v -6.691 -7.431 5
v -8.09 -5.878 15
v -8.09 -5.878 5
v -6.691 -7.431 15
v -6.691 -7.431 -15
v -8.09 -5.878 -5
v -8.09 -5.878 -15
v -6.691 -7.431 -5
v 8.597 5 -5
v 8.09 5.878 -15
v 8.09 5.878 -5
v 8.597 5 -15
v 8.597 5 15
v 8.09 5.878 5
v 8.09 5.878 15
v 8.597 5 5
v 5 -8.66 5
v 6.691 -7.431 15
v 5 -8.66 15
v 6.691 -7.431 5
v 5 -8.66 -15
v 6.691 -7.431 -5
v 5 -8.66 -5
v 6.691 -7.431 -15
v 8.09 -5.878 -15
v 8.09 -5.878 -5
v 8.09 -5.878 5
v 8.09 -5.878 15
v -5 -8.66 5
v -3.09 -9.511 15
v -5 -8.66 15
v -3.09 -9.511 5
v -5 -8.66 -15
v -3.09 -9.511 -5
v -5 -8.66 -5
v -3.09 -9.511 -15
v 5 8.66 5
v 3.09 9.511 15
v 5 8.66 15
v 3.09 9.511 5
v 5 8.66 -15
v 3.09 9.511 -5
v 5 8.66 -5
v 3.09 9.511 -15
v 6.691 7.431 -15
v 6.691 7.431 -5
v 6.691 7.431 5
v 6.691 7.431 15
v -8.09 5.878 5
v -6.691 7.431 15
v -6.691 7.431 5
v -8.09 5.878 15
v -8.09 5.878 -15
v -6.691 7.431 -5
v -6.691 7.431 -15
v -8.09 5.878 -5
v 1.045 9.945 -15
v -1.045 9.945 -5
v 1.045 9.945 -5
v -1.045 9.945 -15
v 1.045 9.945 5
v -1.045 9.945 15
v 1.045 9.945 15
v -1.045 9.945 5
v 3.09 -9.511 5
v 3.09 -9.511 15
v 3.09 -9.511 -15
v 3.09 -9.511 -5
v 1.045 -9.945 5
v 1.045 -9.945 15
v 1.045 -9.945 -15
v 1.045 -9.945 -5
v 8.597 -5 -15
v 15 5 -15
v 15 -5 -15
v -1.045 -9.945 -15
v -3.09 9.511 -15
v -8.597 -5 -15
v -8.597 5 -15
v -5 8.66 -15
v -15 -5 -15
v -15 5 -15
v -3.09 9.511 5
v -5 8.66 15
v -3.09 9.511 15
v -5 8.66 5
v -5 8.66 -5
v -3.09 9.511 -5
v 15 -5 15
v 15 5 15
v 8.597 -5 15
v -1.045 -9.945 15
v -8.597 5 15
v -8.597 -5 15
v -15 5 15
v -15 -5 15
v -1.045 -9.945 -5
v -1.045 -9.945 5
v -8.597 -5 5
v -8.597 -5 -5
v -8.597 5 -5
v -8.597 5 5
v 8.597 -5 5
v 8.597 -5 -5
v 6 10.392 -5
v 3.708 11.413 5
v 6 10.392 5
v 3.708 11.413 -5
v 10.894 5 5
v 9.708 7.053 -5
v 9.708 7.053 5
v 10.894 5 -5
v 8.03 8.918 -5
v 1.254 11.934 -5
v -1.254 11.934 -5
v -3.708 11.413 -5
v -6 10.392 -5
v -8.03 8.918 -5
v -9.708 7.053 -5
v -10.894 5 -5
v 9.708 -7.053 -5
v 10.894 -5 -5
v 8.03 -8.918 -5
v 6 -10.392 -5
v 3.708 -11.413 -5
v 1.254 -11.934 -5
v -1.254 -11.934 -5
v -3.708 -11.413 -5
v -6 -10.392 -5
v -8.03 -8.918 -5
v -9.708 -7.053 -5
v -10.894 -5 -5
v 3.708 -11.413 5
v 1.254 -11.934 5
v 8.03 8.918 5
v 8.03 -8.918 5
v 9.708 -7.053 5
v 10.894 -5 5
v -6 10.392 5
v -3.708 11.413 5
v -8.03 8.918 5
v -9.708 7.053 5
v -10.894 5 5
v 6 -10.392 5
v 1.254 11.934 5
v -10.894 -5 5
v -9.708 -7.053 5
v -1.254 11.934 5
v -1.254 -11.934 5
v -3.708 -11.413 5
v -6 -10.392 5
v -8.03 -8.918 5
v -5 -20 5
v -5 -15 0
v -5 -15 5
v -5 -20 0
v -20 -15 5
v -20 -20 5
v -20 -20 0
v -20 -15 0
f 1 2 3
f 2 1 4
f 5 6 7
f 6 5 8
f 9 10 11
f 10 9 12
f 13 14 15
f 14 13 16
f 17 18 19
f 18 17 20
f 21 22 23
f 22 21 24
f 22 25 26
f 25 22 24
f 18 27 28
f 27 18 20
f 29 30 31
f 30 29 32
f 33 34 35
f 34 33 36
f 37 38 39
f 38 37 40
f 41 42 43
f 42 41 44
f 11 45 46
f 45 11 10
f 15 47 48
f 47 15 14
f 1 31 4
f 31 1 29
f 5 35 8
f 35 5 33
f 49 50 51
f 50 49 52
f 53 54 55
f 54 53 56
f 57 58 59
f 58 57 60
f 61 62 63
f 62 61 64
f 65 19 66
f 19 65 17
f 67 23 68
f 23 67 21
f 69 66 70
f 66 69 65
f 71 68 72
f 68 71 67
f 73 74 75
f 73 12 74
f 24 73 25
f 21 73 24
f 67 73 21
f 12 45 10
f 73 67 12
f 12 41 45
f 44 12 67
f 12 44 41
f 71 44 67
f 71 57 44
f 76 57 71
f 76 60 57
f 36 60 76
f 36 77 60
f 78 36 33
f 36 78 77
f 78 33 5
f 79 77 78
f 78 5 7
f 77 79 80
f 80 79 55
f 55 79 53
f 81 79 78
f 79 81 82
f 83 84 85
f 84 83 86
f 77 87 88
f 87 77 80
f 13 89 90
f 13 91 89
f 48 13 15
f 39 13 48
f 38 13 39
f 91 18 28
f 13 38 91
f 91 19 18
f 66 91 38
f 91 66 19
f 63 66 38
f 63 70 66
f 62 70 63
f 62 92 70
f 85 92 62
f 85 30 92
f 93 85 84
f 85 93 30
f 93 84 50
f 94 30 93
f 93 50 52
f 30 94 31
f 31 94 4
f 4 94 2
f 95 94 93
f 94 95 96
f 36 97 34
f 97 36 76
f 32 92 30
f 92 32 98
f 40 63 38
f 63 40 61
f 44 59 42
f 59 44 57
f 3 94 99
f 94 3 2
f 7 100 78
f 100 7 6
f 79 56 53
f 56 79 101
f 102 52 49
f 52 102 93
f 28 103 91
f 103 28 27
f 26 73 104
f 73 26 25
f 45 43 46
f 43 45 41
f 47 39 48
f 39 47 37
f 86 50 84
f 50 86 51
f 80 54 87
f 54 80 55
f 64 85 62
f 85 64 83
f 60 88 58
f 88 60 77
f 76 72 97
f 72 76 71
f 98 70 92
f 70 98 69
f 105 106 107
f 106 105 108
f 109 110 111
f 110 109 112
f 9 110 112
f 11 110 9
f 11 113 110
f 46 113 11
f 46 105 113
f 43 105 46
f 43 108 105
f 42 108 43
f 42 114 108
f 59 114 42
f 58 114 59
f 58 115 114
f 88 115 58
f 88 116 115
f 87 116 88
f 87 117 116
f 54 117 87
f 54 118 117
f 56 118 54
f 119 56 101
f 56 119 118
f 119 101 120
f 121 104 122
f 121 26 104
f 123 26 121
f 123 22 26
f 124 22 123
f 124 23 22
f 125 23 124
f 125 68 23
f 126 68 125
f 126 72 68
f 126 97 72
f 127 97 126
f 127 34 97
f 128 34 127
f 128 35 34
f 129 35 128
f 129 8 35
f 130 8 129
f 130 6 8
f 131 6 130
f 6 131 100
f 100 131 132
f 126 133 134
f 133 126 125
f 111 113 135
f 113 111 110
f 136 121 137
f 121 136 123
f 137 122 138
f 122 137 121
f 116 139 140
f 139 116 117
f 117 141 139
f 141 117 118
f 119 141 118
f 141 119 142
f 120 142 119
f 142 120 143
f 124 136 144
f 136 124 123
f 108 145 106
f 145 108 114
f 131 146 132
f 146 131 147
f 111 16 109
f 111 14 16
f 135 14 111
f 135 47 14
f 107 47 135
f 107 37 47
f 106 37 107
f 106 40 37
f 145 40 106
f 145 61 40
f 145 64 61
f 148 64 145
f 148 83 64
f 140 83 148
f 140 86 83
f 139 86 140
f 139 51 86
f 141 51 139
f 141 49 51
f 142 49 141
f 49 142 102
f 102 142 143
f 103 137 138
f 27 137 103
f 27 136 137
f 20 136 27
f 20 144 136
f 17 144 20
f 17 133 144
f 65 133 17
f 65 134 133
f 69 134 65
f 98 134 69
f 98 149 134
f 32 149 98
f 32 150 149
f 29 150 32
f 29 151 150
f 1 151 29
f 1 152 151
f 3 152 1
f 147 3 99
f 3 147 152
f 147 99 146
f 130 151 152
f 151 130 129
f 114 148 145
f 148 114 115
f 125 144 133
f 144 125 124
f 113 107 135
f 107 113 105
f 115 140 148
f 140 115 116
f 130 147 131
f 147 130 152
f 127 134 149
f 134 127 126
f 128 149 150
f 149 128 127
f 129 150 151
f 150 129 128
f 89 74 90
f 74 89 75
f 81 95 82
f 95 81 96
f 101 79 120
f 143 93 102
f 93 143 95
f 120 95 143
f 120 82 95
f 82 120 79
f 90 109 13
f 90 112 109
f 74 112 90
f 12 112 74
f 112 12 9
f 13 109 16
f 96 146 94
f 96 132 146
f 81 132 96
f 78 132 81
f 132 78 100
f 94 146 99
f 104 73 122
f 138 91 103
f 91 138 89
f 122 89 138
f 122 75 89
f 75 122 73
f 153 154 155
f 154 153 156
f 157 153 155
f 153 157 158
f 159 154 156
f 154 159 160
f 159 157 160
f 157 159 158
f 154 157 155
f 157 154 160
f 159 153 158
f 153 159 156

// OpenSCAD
// Generated by generate_scads.py
union() {
  sphere(r=10);
  union() {
    cylinder(h=30, r=10, center=true);
    cylinder(h=10, r=12, center=true);
    cube(size=[30,10,30], center=true);
  }
  translate([-20,-20,0]) {
    cube(size=[15,5,5], center=false);
  }
  sphere(r=8);
}
